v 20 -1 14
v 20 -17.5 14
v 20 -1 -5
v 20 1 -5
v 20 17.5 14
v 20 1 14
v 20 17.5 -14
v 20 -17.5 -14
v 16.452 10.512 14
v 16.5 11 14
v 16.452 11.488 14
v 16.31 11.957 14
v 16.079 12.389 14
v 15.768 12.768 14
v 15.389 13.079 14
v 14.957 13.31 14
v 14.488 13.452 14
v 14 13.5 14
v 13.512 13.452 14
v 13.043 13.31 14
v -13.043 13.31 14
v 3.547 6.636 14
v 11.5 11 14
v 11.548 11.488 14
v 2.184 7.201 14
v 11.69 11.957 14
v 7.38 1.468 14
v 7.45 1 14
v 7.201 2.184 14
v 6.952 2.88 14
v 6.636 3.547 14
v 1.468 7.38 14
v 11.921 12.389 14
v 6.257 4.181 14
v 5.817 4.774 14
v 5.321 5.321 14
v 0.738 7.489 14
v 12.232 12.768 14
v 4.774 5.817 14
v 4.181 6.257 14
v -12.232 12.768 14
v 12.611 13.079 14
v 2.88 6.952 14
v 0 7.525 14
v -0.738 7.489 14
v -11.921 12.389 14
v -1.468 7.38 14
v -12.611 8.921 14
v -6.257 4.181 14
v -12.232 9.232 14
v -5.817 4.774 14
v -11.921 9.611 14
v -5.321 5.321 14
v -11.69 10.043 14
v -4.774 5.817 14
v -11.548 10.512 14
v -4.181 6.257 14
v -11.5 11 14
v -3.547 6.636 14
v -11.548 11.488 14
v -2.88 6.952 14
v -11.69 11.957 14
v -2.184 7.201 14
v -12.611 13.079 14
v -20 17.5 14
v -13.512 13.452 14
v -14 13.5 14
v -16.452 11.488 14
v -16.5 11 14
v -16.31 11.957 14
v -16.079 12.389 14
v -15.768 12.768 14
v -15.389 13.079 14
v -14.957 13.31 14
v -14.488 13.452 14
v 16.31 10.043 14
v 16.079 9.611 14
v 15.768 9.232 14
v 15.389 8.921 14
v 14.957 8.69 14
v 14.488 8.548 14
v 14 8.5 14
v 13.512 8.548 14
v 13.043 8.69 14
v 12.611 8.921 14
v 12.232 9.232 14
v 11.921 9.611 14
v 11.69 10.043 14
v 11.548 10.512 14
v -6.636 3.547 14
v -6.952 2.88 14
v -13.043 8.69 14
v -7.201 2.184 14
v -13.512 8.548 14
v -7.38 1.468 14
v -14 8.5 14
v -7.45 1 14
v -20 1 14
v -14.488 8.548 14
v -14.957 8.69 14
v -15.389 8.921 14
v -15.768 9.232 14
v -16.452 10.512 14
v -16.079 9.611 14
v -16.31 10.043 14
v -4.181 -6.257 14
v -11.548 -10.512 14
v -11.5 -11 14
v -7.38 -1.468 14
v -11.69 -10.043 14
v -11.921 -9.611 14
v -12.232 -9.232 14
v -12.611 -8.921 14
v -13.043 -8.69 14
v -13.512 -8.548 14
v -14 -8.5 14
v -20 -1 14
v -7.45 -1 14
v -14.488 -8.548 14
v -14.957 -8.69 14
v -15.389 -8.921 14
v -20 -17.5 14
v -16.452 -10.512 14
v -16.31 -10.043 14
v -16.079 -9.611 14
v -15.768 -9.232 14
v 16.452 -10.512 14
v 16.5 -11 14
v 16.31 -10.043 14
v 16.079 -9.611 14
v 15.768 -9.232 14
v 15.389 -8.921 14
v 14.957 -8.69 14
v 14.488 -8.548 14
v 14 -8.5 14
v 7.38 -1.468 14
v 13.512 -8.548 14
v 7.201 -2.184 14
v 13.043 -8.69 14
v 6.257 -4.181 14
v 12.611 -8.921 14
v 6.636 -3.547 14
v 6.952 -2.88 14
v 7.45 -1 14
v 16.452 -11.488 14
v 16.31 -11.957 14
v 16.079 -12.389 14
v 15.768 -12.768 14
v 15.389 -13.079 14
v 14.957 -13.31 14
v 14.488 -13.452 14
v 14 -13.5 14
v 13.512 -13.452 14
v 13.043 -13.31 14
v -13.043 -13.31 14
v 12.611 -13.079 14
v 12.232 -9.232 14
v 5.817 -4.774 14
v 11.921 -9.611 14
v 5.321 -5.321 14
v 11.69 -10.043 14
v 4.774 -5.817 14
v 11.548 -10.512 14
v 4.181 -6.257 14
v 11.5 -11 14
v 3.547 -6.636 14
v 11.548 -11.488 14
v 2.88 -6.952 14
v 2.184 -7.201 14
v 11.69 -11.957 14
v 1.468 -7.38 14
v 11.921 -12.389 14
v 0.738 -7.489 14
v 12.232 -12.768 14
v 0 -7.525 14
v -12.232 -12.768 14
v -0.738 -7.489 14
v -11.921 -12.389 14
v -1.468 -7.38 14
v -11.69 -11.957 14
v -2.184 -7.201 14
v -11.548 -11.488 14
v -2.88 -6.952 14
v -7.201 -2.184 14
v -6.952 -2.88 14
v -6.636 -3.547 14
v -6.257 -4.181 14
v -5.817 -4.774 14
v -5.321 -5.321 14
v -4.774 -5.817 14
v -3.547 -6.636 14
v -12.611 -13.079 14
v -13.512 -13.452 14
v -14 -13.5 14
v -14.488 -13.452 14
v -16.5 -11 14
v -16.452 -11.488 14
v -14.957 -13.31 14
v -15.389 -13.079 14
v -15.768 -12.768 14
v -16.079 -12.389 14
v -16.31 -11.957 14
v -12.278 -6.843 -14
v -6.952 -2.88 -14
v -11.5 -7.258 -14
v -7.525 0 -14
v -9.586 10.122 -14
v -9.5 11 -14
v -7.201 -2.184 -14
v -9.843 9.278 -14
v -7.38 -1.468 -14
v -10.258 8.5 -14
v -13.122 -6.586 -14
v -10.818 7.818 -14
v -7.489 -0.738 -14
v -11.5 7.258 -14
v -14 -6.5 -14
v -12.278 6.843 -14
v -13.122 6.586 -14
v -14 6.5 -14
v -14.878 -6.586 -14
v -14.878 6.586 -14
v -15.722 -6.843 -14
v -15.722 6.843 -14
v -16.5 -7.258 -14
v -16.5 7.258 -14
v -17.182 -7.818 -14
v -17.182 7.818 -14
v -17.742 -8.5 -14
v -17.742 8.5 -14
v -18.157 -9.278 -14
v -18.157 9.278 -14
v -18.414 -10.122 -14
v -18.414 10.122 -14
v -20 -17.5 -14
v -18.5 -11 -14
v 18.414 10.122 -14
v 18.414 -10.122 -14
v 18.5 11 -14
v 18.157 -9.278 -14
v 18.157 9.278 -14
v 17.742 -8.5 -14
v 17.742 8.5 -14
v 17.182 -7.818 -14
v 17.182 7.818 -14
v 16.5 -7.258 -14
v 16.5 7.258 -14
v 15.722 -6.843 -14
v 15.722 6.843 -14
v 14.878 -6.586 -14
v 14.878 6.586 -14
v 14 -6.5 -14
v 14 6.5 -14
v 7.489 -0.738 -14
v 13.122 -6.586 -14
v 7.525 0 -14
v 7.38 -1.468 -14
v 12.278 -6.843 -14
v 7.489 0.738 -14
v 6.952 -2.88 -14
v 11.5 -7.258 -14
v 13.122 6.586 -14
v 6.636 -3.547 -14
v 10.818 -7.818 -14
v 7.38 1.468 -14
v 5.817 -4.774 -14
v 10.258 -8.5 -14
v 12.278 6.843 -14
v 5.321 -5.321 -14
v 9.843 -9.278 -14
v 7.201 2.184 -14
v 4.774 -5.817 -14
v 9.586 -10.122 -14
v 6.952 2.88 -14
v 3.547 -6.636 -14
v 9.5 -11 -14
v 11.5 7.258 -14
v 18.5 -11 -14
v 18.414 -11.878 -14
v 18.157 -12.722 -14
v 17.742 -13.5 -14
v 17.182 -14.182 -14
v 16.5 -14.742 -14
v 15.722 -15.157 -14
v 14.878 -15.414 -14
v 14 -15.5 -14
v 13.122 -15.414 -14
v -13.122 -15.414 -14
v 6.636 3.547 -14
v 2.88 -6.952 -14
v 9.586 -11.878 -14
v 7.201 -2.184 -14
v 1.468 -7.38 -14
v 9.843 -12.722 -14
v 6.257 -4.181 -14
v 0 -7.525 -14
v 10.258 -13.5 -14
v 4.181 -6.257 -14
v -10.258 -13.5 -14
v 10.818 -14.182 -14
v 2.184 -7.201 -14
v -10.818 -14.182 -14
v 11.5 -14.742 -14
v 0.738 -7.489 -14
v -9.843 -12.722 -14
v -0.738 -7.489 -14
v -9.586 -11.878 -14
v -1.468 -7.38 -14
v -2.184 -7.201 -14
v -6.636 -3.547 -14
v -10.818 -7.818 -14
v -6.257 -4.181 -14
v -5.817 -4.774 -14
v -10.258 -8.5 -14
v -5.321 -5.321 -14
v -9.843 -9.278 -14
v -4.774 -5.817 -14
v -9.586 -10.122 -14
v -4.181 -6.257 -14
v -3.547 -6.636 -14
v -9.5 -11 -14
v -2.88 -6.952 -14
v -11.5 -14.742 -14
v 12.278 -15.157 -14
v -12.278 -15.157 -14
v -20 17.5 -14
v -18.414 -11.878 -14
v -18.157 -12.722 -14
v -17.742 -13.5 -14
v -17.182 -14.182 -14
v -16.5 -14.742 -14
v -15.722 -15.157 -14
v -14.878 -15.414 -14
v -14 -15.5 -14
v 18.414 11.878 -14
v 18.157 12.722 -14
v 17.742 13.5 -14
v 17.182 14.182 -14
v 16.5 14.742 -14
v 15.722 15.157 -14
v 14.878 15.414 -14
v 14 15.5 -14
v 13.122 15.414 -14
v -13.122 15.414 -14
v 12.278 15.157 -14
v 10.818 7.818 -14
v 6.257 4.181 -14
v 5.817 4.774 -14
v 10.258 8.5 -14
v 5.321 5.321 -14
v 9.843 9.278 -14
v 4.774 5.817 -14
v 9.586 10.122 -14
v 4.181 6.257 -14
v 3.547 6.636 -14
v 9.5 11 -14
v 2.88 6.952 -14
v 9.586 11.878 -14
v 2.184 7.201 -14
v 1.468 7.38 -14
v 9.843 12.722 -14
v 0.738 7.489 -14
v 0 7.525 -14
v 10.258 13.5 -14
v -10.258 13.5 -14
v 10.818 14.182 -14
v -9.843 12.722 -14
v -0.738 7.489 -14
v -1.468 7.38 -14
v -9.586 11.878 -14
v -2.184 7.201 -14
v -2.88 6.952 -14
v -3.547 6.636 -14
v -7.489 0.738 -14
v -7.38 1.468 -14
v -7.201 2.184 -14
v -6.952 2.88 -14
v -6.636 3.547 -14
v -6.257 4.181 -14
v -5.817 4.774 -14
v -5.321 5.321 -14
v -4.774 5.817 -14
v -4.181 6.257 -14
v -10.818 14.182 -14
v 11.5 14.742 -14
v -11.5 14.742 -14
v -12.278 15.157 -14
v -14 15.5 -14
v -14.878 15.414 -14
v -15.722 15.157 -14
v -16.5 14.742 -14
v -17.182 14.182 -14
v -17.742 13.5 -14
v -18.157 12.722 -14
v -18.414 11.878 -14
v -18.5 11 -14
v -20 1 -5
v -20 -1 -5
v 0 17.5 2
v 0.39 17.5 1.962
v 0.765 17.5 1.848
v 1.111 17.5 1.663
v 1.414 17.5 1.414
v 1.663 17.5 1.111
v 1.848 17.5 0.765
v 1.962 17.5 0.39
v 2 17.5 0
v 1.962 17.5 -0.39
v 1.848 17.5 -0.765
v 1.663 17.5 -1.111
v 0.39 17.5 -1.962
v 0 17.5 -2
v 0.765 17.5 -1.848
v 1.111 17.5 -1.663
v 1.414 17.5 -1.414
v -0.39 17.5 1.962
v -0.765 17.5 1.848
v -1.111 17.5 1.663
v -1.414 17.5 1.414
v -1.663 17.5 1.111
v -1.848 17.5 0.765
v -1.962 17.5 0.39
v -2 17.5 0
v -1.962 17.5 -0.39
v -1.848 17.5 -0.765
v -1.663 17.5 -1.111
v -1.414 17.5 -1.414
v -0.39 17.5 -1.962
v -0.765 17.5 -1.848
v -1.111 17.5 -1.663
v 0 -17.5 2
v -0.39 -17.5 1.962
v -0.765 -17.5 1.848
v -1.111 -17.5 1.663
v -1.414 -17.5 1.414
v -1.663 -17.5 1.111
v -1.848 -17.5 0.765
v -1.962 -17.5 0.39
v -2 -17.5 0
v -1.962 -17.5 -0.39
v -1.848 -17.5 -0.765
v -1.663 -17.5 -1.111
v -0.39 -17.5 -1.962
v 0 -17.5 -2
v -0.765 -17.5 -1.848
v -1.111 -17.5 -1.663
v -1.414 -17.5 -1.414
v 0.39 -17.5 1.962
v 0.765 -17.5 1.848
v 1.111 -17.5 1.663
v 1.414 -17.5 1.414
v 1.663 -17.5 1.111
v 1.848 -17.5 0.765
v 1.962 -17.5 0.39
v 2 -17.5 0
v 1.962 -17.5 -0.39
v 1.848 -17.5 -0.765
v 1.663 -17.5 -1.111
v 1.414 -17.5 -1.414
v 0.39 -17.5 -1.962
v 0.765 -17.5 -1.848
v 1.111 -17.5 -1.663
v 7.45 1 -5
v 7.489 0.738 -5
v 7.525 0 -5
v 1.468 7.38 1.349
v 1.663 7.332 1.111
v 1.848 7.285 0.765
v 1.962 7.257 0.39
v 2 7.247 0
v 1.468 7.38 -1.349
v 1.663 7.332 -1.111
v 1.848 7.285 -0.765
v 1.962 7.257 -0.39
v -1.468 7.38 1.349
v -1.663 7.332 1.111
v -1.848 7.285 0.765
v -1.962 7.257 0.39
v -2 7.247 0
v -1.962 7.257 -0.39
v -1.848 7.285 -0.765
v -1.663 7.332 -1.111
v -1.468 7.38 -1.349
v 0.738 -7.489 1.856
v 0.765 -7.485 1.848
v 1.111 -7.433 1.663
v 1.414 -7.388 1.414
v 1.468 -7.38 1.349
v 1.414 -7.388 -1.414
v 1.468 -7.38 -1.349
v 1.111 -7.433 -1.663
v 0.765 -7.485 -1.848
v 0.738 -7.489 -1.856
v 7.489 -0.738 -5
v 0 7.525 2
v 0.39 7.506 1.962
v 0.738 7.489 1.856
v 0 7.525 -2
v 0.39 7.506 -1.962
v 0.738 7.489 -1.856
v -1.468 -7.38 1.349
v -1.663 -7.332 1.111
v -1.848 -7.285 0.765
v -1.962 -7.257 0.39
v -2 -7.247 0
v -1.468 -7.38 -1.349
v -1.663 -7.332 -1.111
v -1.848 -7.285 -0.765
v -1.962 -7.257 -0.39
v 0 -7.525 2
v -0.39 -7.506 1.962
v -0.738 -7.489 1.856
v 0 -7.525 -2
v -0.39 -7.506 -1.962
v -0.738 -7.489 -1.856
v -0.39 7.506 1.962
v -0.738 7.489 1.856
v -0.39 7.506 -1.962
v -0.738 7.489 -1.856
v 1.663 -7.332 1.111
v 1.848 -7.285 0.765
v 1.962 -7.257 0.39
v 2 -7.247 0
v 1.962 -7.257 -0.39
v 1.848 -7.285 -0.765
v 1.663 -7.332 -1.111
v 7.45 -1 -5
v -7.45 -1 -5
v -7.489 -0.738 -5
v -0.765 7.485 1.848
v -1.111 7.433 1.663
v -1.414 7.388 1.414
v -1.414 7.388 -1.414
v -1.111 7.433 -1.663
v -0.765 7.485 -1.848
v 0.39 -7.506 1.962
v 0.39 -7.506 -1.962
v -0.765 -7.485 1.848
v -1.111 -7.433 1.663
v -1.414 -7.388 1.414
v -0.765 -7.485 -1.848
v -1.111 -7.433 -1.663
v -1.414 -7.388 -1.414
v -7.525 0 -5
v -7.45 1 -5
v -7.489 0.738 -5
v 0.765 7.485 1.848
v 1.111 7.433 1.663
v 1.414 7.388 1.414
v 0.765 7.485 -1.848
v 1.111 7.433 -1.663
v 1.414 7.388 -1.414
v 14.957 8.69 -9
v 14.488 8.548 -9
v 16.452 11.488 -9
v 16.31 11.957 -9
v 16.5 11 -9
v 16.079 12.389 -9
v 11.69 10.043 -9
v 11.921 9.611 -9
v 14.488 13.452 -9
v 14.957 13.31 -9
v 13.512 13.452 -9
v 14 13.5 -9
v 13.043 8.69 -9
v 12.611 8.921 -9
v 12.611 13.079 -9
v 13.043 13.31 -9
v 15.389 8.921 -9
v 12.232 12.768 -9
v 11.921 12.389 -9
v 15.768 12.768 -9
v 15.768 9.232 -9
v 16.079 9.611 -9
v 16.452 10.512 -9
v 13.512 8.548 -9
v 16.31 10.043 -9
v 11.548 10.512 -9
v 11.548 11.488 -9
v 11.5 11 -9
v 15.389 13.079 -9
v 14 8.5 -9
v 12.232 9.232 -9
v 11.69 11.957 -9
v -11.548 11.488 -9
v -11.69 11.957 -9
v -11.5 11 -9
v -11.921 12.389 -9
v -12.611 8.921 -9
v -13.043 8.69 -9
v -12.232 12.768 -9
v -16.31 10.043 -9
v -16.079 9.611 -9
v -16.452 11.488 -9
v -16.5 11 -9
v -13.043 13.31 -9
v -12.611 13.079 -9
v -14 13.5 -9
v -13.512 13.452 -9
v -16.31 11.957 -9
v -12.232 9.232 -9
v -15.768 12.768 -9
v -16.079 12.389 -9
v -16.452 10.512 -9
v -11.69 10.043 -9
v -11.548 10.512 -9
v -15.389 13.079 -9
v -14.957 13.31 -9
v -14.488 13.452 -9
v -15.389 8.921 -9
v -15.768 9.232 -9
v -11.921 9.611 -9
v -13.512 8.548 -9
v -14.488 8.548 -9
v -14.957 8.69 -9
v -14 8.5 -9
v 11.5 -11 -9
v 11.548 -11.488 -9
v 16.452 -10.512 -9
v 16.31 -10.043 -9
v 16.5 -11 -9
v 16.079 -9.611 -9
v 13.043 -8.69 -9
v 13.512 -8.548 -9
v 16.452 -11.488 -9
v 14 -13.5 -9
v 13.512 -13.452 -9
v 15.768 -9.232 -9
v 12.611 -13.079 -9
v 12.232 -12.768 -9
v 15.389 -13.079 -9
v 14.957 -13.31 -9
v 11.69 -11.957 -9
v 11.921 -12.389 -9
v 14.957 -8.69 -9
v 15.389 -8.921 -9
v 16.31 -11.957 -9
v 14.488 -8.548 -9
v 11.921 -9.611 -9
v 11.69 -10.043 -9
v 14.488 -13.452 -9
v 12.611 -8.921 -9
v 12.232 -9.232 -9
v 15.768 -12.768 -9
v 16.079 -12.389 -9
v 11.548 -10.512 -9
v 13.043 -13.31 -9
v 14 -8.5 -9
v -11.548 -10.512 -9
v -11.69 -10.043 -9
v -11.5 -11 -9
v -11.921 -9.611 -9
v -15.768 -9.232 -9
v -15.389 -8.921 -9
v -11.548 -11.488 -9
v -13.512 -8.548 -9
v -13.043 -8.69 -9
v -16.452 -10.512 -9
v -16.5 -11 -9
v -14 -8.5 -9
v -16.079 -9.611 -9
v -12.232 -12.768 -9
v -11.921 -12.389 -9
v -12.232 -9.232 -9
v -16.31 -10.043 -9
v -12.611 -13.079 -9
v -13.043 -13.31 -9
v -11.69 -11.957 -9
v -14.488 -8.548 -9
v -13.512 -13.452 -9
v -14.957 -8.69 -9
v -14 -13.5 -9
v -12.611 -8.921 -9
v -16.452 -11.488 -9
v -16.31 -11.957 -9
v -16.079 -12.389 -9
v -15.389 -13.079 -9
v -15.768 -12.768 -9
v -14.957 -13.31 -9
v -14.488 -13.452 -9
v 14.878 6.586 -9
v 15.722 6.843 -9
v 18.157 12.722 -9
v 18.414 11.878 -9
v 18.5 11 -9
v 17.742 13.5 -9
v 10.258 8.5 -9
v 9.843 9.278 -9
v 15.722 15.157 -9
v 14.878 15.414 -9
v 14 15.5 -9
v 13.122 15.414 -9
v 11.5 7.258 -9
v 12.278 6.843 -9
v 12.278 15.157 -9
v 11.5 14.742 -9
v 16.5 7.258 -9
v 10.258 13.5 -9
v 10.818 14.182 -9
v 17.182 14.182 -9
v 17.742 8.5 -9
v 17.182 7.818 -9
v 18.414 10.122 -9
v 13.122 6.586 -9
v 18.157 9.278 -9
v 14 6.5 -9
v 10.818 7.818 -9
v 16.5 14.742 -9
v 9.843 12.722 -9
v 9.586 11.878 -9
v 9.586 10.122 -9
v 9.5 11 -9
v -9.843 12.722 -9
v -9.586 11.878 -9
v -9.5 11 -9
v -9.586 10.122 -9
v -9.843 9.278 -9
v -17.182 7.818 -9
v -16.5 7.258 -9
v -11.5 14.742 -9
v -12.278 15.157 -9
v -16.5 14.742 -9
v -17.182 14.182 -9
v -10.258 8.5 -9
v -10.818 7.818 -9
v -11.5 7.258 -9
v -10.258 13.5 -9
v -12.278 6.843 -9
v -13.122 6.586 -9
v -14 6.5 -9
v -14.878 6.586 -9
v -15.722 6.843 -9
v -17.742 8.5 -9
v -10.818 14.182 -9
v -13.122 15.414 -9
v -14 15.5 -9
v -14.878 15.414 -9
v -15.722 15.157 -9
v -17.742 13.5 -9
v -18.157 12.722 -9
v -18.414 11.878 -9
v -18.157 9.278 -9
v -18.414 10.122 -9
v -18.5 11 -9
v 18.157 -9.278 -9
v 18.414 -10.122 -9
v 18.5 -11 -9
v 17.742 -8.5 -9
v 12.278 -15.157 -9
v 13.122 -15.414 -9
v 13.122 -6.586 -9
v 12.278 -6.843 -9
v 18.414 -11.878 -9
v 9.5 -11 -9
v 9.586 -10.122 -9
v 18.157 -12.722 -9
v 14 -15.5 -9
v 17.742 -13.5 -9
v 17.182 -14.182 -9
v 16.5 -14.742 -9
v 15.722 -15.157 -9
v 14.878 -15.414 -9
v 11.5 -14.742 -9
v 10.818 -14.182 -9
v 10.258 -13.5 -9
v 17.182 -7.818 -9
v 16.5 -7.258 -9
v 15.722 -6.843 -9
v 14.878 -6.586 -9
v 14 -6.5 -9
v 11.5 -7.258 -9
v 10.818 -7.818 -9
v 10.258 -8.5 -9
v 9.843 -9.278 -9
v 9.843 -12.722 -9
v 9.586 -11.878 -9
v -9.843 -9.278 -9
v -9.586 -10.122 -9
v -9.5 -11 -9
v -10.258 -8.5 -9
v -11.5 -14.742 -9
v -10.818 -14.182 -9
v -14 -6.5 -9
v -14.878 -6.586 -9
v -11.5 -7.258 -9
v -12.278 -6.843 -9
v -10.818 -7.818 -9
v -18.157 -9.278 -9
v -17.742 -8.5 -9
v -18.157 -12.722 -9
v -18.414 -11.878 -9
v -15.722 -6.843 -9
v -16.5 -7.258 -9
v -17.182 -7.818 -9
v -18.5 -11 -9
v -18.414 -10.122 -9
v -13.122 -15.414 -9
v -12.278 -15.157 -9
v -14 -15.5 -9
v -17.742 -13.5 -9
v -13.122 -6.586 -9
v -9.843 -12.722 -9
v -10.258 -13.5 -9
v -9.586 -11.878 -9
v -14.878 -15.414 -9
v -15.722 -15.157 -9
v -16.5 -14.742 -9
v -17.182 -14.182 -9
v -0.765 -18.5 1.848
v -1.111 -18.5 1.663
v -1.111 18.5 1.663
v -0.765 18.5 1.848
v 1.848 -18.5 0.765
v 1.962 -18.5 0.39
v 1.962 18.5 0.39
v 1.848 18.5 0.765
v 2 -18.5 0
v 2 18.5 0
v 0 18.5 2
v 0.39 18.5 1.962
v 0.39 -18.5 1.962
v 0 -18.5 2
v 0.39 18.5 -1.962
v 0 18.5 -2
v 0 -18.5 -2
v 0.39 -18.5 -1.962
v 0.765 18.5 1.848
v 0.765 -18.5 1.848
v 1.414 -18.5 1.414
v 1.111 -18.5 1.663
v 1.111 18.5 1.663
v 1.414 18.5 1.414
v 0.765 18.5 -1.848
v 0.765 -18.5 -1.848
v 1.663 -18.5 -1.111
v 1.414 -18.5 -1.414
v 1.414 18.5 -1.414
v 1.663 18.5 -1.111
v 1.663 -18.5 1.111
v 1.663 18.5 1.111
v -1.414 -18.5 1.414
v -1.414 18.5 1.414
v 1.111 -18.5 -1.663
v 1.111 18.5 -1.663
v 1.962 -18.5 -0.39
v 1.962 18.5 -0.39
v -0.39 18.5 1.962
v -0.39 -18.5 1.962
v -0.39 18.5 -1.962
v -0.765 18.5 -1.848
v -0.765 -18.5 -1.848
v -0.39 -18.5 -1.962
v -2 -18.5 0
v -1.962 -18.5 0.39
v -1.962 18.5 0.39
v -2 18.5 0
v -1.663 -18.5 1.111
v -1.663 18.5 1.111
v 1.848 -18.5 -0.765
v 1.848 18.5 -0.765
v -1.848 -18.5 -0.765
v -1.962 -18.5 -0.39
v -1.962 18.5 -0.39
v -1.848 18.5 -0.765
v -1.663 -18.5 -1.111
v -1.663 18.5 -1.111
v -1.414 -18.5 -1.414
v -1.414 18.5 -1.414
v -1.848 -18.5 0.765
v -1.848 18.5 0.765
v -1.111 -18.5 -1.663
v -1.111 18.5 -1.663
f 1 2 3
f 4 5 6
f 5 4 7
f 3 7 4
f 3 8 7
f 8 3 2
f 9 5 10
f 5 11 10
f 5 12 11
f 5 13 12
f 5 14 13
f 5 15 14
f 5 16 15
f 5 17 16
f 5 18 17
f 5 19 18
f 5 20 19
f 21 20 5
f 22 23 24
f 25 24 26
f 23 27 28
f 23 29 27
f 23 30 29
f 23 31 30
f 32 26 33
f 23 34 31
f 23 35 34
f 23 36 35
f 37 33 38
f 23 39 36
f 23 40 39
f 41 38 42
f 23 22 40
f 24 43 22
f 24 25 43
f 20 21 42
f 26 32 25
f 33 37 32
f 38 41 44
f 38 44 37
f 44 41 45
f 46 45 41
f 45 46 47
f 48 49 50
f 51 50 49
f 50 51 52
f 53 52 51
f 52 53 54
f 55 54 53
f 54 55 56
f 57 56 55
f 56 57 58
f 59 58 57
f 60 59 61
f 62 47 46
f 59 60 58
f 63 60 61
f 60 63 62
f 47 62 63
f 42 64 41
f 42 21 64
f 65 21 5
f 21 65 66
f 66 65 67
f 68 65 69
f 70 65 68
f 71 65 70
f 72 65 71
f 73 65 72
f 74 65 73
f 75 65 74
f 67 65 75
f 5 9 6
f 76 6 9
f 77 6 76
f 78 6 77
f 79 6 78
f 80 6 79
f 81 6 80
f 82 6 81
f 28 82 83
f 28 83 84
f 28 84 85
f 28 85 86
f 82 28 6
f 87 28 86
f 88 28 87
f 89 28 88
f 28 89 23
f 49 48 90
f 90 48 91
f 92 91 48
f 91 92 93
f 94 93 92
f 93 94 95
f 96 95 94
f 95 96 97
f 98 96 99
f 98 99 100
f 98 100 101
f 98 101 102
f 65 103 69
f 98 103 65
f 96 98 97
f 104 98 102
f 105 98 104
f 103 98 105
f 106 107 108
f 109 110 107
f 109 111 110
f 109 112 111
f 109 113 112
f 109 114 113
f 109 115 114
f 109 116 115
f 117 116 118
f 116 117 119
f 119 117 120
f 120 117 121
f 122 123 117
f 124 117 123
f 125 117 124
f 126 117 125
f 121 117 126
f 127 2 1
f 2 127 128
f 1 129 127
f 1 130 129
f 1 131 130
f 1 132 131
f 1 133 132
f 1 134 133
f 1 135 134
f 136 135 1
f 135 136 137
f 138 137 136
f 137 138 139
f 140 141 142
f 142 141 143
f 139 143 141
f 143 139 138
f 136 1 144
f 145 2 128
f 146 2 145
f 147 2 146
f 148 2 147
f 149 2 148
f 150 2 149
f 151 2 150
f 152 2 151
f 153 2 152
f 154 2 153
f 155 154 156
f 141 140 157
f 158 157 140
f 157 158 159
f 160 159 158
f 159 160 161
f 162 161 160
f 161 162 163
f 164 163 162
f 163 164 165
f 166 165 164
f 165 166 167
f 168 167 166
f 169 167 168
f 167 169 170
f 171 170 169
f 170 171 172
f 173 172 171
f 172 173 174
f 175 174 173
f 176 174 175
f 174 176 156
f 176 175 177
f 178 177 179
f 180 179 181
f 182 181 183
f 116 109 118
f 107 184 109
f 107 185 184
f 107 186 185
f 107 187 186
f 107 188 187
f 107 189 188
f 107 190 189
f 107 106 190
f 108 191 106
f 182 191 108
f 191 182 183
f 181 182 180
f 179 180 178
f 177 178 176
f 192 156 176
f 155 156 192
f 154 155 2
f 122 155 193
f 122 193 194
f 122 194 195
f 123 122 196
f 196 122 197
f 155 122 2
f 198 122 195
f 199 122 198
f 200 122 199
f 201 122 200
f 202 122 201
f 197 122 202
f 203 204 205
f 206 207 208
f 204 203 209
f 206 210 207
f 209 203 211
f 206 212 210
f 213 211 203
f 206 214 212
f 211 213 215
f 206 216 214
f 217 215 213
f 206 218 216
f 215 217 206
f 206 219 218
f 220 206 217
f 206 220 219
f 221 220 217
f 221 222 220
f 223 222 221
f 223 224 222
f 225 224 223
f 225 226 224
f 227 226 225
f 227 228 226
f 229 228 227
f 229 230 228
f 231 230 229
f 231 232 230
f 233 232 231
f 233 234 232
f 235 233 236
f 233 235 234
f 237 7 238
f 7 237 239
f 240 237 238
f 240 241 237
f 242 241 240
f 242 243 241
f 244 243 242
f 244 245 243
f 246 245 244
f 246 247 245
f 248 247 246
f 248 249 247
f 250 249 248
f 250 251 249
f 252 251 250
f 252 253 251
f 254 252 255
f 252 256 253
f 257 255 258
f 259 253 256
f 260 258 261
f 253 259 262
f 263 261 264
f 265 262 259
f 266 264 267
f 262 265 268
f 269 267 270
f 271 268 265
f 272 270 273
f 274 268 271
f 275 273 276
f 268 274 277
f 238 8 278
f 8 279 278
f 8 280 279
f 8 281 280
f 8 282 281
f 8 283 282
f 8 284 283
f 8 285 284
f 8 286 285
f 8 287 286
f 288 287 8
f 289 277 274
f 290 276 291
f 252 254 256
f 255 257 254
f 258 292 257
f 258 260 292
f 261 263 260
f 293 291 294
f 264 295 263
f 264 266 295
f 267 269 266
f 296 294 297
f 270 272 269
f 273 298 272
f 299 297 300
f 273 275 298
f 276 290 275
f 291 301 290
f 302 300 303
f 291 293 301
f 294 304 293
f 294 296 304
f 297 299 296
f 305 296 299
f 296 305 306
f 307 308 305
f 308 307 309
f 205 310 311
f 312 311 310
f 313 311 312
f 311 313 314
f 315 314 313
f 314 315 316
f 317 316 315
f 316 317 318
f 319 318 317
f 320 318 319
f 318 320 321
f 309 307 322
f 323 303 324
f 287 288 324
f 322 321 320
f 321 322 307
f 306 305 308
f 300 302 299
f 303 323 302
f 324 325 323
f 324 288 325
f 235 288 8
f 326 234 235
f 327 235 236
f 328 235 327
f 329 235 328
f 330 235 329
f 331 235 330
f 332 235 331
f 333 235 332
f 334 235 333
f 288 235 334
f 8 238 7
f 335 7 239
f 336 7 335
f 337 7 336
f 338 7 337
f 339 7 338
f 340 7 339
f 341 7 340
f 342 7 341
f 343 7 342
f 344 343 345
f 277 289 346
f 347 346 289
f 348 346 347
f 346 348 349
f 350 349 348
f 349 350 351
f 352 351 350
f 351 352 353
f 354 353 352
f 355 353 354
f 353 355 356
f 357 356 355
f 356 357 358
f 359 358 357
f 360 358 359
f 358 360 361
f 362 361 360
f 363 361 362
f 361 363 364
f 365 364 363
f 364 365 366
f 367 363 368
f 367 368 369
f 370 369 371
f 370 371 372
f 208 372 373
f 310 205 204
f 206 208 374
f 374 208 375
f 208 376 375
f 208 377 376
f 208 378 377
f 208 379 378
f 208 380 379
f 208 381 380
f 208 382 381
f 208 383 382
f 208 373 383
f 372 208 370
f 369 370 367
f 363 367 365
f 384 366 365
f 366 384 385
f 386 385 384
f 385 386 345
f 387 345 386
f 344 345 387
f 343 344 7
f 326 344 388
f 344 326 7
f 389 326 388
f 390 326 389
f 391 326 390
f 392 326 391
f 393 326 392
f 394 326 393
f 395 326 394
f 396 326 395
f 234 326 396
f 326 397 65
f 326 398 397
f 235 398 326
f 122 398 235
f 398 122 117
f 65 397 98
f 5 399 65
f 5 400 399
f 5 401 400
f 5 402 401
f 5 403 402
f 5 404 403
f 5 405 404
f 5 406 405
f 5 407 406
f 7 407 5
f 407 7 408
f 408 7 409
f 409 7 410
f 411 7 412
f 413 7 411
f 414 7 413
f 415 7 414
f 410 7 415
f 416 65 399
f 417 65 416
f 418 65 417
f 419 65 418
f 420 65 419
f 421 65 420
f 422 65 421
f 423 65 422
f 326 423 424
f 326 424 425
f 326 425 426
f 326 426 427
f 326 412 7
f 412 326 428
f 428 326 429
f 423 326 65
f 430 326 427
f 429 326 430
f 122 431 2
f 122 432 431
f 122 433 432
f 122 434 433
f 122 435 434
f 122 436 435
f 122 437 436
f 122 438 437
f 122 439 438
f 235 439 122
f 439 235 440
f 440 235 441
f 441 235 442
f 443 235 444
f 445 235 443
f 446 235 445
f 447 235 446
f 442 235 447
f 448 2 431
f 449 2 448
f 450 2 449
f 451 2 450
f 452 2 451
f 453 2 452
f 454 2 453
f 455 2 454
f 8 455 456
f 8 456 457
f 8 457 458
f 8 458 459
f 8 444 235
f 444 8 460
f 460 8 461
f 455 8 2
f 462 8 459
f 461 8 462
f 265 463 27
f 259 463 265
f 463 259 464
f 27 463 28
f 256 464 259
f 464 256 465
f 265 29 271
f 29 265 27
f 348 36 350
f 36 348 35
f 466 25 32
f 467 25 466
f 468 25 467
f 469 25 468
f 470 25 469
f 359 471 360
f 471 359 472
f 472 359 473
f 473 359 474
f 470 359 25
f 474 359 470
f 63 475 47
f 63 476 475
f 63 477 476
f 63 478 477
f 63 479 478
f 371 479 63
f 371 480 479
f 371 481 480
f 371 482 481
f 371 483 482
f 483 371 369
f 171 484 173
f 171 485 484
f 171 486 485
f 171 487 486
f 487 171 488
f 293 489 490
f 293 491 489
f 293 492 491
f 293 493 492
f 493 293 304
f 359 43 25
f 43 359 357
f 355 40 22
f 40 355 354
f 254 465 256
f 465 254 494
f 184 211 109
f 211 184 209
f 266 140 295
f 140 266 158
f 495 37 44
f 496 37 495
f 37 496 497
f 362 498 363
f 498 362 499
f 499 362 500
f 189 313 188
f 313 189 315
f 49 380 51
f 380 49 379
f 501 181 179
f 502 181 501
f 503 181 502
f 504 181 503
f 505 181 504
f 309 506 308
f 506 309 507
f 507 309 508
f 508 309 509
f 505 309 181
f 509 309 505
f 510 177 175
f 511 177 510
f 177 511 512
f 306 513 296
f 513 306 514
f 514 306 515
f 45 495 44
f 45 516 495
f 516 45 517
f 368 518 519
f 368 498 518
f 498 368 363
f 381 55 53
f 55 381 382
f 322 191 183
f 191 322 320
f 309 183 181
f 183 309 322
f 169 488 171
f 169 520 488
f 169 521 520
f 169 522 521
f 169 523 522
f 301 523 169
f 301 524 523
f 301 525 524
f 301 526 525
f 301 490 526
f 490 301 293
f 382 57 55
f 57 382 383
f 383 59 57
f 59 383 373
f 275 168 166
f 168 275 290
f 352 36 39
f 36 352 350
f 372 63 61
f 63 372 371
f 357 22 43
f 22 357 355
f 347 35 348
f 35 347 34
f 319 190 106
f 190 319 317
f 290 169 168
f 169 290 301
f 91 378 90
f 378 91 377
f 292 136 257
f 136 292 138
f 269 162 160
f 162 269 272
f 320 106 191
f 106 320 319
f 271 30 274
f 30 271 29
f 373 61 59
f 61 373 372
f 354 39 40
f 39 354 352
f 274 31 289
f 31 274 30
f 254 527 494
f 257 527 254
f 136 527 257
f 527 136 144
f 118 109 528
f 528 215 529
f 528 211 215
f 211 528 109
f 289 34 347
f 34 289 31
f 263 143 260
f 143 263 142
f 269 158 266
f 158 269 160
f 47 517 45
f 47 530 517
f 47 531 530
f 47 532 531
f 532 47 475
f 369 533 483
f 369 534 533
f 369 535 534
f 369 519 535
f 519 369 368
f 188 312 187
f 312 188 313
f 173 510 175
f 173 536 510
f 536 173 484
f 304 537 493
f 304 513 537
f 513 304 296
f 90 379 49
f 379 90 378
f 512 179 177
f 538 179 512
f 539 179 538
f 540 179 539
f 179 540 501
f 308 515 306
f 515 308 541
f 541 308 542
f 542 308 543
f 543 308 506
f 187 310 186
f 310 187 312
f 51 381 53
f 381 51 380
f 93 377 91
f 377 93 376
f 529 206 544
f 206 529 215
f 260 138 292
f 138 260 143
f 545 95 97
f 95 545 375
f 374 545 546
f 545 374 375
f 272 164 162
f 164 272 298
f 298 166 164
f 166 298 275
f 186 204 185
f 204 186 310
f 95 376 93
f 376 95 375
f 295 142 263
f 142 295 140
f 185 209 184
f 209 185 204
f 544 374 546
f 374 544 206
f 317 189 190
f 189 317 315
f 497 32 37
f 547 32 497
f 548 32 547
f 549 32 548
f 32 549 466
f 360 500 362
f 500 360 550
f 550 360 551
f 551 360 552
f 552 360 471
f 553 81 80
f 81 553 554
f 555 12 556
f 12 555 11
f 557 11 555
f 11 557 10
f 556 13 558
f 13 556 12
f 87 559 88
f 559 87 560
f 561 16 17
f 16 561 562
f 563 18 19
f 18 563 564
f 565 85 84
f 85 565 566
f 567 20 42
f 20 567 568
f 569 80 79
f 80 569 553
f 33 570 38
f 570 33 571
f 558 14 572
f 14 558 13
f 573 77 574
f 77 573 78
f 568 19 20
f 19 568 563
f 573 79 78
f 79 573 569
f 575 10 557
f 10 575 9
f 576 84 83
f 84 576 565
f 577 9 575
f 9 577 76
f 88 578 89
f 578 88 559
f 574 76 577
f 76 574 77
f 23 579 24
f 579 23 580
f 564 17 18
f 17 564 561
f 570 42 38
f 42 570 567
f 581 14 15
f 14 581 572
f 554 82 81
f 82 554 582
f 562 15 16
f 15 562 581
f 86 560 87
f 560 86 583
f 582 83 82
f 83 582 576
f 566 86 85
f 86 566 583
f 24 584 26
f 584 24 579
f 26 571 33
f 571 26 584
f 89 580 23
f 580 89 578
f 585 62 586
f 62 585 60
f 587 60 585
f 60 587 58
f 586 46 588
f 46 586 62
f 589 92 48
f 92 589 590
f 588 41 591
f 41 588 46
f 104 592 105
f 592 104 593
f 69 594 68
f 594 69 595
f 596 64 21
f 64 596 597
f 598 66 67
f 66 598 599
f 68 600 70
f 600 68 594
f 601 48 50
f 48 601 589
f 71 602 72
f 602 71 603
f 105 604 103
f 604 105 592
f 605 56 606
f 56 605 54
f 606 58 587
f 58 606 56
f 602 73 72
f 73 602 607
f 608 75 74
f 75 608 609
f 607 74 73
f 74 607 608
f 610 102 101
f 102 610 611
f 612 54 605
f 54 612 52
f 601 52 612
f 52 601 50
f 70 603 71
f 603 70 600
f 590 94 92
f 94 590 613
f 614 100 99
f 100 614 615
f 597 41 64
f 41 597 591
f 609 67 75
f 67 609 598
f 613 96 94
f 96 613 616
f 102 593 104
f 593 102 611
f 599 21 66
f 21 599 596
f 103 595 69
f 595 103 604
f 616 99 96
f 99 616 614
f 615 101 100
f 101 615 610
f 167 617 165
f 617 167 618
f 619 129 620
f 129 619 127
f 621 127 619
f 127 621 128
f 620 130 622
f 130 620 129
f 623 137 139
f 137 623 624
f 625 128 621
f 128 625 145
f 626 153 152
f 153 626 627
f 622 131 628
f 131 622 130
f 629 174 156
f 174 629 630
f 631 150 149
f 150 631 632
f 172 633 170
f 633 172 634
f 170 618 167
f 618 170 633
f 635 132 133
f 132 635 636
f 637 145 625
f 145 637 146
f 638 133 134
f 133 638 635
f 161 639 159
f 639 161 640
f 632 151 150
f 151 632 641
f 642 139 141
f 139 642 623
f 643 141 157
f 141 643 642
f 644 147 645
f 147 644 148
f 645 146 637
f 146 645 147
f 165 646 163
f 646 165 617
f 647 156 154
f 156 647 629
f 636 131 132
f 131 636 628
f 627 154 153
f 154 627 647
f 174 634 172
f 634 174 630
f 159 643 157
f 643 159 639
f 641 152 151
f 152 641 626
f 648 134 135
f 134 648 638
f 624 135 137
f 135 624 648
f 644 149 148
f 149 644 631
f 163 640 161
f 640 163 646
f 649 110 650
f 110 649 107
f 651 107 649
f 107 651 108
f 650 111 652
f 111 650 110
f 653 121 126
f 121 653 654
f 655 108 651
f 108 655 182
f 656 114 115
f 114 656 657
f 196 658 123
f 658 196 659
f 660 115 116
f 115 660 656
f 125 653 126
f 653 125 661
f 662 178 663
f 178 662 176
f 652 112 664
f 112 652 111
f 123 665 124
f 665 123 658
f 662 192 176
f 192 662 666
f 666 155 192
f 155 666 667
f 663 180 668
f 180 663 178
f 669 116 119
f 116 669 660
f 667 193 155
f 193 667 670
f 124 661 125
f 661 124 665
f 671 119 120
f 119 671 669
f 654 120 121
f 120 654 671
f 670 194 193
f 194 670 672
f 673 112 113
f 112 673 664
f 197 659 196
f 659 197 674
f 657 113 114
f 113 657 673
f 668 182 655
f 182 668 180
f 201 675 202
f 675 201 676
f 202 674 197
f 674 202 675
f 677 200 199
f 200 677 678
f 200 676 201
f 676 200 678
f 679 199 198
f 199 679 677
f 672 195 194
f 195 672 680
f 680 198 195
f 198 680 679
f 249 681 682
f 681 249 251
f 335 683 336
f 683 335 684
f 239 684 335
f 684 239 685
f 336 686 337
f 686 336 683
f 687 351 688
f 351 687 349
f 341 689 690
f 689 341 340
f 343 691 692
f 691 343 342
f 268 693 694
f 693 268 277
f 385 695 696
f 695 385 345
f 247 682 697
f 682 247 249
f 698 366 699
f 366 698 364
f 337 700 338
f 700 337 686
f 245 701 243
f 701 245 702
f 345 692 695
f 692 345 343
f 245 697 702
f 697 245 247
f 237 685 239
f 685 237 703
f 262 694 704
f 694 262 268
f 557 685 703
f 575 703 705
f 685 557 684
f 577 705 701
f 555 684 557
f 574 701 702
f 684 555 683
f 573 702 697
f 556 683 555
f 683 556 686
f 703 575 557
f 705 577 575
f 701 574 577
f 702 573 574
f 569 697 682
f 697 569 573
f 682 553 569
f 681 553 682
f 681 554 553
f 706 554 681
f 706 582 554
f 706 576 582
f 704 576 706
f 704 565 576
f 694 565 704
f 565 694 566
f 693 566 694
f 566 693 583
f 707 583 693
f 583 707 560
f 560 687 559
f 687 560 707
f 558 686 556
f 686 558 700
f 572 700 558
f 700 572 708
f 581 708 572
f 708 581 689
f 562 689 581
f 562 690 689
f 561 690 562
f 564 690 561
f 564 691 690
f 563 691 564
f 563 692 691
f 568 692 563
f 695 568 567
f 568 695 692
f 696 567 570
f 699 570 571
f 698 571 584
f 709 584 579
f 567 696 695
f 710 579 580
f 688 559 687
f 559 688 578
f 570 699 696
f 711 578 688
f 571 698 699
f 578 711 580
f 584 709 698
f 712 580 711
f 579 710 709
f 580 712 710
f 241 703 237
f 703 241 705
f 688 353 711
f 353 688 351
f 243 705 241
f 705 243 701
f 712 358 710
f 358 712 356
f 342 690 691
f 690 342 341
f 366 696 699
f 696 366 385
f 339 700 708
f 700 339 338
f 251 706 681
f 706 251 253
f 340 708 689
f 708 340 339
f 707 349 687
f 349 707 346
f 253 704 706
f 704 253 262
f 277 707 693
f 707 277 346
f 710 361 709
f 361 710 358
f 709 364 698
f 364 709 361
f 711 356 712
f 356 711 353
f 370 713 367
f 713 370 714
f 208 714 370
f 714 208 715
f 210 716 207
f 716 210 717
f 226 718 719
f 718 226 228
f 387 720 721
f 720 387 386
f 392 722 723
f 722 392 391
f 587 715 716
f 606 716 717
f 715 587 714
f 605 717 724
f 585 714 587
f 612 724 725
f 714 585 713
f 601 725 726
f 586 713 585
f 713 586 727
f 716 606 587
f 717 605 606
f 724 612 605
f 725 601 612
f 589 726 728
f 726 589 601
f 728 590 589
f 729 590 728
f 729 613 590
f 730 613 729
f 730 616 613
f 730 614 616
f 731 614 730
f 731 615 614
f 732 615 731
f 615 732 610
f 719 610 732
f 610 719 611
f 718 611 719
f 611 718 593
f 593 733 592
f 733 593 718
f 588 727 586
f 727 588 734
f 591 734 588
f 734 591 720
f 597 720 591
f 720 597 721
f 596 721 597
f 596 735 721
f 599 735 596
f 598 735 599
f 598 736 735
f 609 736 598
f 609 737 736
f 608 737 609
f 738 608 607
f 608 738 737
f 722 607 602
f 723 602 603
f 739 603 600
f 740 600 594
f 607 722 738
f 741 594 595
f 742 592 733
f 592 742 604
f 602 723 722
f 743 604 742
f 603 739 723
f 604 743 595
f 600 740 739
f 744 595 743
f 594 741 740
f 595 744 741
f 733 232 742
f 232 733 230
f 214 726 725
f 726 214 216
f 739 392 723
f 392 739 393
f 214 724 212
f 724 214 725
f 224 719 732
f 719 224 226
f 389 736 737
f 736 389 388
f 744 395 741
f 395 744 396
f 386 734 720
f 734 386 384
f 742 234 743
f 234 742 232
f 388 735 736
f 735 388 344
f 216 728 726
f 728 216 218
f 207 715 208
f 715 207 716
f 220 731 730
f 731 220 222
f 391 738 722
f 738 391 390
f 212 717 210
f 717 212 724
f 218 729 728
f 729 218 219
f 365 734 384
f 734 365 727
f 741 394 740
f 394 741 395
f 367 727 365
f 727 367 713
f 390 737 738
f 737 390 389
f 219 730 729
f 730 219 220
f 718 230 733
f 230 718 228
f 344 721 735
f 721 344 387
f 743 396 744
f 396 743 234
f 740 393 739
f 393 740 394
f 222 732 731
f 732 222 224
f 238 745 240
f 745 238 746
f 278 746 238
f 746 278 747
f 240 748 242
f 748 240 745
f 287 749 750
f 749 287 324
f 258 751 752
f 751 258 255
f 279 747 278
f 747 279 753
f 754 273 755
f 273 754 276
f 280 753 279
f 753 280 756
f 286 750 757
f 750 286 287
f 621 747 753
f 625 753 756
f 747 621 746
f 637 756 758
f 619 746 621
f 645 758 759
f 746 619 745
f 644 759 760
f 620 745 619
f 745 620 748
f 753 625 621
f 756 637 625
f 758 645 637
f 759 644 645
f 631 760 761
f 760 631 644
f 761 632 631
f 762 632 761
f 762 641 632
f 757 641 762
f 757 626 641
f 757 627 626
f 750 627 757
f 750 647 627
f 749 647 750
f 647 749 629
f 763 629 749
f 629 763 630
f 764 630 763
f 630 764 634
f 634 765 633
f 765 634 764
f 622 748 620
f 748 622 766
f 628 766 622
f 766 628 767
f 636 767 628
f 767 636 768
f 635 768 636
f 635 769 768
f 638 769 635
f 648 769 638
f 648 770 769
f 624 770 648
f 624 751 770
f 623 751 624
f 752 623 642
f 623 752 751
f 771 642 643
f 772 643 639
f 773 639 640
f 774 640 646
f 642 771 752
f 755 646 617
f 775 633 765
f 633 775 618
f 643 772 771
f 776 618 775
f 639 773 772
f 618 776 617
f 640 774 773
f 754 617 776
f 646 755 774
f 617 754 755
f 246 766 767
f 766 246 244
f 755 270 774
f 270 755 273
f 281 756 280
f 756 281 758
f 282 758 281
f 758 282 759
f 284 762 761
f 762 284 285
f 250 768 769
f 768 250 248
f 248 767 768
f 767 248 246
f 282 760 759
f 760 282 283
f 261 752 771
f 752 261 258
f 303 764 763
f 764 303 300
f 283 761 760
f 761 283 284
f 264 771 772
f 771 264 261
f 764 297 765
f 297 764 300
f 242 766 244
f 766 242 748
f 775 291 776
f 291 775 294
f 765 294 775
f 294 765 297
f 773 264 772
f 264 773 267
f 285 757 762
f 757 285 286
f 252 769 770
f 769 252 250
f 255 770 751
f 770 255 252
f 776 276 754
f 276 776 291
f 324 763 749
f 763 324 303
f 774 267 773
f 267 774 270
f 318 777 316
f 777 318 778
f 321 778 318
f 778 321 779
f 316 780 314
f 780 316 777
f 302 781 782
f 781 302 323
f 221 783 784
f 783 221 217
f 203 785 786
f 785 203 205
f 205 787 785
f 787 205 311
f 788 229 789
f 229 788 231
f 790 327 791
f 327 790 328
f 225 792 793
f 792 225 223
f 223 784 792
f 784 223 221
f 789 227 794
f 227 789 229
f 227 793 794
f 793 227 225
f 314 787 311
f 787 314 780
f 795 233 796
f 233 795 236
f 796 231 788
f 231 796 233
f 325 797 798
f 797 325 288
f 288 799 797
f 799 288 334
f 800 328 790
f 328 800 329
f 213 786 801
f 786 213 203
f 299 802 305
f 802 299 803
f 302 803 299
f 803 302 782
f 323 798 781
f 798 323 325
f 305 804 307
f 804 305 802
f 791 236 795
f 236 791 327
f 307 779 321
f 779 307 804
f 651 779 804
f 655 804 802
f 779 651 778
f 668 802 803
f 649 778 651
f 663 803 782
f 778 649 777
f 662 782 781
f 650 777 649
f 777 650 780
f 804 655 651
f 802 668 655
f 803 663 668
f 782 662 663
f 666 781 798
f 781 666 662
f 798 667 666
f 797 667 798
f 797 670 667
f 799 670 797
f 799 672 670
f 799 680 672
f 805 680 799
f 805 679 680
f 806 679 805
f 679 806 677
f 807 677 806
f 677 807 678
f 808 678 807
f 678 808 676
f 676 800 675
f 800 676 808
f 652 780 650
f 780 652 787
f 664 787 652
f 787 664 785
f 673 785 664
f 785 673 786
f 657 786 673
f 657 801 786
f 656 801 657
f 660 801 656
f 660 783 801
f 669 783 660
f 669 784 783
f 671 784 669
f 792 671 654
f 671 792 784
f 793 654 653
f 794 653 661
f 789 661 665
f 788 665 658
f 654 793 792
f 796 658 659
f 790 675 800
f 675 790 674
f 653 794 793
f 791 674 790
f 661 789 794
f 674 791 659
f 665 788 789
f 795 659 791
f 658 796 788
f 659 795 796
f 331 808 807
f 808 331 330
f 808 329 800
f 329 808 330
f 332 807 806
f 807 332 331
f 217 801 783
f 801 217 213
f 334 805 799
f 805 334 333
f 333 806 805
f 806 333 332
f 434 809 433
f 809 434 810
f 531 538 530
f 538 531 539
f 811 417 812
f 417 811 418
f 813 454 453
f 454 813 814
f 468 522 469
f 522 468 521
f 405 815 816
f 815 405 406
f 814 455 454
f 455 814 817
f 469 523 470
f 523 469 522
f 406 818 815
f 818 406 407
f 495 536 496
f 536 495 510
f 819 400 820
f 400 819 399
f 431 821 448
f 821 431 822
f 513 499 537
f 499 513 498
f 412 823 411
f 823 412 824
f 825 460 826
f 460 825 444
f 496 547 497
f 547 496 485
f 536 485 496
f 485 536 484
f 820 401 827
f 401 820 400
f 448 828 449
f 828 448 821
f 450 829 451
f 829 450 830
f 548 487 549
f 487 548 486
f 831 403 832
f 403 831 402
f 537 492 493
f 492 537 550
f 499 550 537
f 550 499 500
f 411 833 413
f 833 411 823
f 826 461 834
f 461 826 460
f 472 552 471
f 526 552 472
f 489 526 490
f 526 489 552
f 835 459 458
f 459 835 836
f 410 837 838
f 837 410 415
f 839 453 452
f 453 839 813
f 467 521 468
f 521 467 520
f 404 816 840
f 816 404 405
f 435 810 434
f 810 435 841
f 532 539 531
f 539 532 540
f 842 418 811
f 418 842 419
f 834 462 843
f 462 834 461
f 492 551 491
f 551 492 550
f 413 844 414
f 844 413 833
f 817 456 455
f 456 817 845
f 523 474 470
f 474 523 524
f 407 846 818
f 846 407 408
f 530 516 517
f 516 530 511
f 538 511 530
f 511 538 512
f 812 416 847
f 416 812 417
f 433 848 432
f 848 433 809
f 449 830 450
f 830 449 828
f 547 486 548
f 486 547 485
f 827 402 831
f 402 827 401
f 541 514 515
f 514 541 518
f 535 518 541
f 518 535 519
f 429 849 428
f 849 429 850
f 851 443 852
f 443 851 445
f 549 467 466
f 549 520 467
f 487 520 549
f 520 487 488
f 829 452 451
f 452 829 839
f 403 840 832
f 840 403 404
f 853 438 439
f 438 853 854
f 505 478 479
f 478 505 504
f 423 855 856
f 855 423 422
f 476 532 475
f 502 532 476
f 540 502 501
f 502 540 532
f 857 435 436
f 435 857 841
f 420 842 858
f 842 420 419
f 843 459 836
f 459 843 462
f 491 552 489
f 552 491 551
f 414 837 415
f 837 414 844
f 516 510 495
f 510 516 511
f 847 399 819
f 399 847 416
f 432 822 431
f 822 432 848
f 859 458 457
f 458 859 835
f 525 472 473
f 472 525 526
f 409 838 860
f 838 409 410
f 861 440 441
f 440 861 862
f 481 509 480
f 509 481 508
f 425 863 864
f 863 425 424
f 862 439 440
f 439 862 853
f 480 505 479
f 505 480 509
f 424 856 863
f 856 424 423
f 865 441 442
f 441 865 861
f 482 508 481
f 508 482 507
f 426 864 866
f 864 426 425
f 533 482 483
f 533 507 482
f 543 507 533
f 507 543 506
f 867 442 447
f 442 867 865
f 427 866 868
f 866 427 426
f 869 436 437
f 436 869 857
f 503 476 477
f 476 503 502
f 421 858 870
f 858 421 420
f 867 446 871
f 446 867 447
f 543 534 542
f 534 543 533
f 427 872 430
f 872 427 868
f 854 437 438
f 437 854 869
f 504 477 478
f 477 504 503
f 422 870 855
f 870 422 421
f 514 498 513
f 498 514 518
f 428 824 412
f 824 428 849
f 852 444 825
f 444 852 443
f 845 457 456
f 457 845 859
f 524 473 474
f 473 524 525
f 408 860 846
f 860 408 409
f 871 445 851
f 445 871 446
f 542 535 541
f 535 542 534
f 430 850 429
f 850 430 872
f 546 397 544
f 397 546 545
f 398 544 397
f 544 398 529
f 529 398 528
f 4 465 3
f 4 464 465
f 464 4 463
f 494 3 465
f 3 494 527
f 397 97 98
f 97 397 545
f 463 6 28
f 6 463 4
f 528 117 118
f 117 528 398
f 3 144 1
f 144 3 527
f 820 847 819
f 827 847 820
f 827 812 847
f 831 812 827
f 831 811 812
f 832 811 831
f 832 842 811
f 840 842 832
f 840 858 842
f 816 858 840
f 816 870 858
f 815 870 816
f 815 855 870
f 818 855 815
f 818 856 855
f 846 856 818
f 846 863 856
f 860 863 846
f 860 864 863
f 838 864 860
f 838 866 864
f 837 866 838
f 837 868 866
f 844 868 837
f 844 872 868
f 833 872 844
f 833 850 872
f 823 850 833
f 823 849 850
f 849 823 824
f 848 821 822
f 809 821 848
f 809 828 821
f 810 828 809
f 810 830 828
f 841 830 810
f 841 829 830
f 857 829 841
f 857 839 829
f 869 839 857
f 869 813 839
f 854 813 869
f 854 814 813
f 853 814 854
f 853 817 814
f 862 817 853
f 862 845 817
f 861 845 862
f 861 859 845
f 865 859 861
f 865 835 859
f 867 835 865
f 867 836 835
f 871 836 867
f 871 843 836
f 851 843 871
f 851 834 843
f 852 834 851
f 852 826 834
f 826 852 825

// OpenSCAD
// Parameters
shaft_diameter_mm = 8; //[4:16:0.1]
shaft_clearance_mm = 0.1; //[0:0.5:0.05]
block_length_mm = 40; //[20:80:1]
block_width_mm = 35; //[18:70:1]
block_height_mm = 28; //[14:56:1]
bearing_outer_diameter_mm = 15; //[10:30:0.1]
bearing_length_mm = 24; //[12:48:0.5]
bearing_bore_extra_mm = 0.05; //[-0.05:0.3:0.01]
mounting_hole_count = 4; //[2:4:1]
mounting_hole_diameter_mm = 5; //[3:8:0.1]
mounting_counterbore_diameter_mm = 9; //[6:14:0.1]
mounting_counterbore_depth_mm = 4; //[1:10:0.1]
mounting_hole_spacing_x_mm = 28; //[14:56:0.5]
mounting_hole_spacing_y_mm = 22; //[11:44:0.5]
edge_margin_mm = 3; //[1.5:8:0.5]
chamfer_mm = 0.5; //[0:2:0.1]
set_screw_diameter_mm = 4; //[2:6:0.1]
set_screw_axis_z_offset_mm = 0; //[-6:6:0.5]
split_clamp_enabled = 1; //[0:1:1]
split_clamp_slot_width_mm = 2; //[0.8:4:0.1]
split_clamp_slot_depth_mm = 18; //[8:26:0.5]
overlap_mm = 1; //[0.5:2:0.1]

// Modules
module bearing_block_body() {
  color([0.85, 0.85, 0.8]) // Off-white for 3D printed PLA
  cube([block_length_mm, block_width_mm, block_height_mm], center=true);
}

module central_bearing_bore() {
  cylinder(r=(bearing_outer_diameter_mm + bearing_bore_extra_mm)/2, 
           h=block_length_mm + 2*overlap_mm, center=true, $fn=64);
}

module shaft_axis_clearance() {
  cylinder(r=(shaft_diameter_mm + shaft_clearance_mm)/2, 
           h=block_length_mm + 2*overlap_mm, center=true, $fn=64);
}

module bearing_retention_features_set_screw() {
  rotate([90, 0, 0])
  cylinder(r=set_screw_diameter_mm/2, 
           h=block_width_mm + 2*overlap_mm, center=true, $fn=32);
}

module split_clamp_slot() {
  if (split_clamp_enabled) {
    translate([0, 0, block_height_mm/2 - (split_clamp_slot_depth_mm + overlap_mm)/2])
    cube([block_length_mm + 2*overlap_mm, split_clamp_slot_width_mm, split_clamp_slot_depth_mm + overlap_mm], center=true);
  }
}

module mounting_hole_pattern() {
  union() {
    translate([mounting_hole_spacing_x_mm/2, mounting_hole_spacing_y_mm/2, 0])
    cylinder(r=mounting_hole_diameter_mm/2, h=block_height_mm + 2*overlap_mm, center=true, $fn=32);
    translate([-mounting_hole_spacing_x_mm/2, mounting_hole_spacing_y_mm/2, 0])
    cylinder(r=mounting_hole_diameter_mm/2, h=block_height_mm + 2*overlap_mm, center=true, $fn=32);
    translate([mounting_hole_spacing_x_mm/2, -mounting_hole_spacing_y_mm/2, 0])
    cylinder(r=mounting_hole_diameter_mm/2, h=block_height_mm + 2*overlap_mm, center=true, $fn=32);
    translate([-mounting_hole_spacing_x_mm/2, -mounting_hole_spacing_y_mm/2, 0])
    cylinder(r=mounting_hole_diameter_mm/2, h=block_height_mm + 2*overlap_mm, center=true, $fn=32);
  }
}

module counterbore_or_countersink_features() {
  union() {
    translate([mounting_hole_spacing_x_mm/2, mounting_hole_spacing_y_mm/2, -block_height_mm/2 + (mounting_counterbore_depth_mm + overlap_mm)/2])
    cylinder(r=mounting_counterbore_diameter_mm/2, h=mounting_counterbore_depth_mm + overlap_mm, center=true, $fn=32);
    translate([-mounting_hole_spacing_x_mm/2, mounting_hole_spacing_y_mm/2, -block_height_mm/2 + (mounting_counterbore_depth_mm + overlap_mm)/2])
    cylinder(r=mounting_counterbore_diameter_mm/2, h=mounting_counterbore_depth_mm + overlap_mm, center=true, $fn=32);
    translate([mounting_hole_spacing_x_mm/2, -mounting_hole_spacing_y_mm/2, -block_height_mm/2 + (mounting_counterbore_depth_mm + overlap_mm)/2])
    cylinder(r=mounting_counterbore_diameter_mm/2, h=mounting_counterbore_depth_mm + overlap_mm, center=true, $fn=32);
    translate([-mounting_hole_spacing_x_mm/2, -mounting_hole_spacing_y_mm/2, -block_height_mm/2 + (mounting_counterbore_depth_mm + overlap_mm)/2])
    cylinder(r=mounting_counterbore_diameter_mm/2, h=mounting_counterbore_depth_mm + overlap_mm, center=true, $fn=32);
  }
}

module bearing_block_body_with_bores() {
  difference() {
    bearing_block_body();
    central_bearing_bore();
    shaft_axis_clearance();
  }
}

module bearing_block_body_with_mounting() {
  difference() {
    bearing_block_body_with_bores();
    mounting_hole_pattern();
    counterbore_or_countersink_features();
  }
}

module bearing_block_body_with_retention() {
  difference() {
    bearing_block_body_with_mounting();
    bearing_retention_features_set_screw();
  }
}

module bearing_block_body_with_optional_split_clamp() {
  difference() {
    bearing_block_body_with_retention();
    split_clamp_slot();
  }
}

module scs_bearing_block_hole_positions() {
  union() {
    mounting_hole_pattern();
    counterbore_or_countersink_features();
  }
}

module scs_bearing_block() {
  bearing_block_body_with_optional_split_clamp();
}

module sbr_bearing_block() {
  union() {
    scs_bearing_block();
    bearing_retention_features_set_screw();
  }
}

module sbr_bearing_block_assembly() {
  union() {
    sbr_bearing_block();
    bearing_block_body_with_optional_split_clamp();
  }
}

module assembly() {
  sbr_bearing_block_assembly();
}

assembly();
